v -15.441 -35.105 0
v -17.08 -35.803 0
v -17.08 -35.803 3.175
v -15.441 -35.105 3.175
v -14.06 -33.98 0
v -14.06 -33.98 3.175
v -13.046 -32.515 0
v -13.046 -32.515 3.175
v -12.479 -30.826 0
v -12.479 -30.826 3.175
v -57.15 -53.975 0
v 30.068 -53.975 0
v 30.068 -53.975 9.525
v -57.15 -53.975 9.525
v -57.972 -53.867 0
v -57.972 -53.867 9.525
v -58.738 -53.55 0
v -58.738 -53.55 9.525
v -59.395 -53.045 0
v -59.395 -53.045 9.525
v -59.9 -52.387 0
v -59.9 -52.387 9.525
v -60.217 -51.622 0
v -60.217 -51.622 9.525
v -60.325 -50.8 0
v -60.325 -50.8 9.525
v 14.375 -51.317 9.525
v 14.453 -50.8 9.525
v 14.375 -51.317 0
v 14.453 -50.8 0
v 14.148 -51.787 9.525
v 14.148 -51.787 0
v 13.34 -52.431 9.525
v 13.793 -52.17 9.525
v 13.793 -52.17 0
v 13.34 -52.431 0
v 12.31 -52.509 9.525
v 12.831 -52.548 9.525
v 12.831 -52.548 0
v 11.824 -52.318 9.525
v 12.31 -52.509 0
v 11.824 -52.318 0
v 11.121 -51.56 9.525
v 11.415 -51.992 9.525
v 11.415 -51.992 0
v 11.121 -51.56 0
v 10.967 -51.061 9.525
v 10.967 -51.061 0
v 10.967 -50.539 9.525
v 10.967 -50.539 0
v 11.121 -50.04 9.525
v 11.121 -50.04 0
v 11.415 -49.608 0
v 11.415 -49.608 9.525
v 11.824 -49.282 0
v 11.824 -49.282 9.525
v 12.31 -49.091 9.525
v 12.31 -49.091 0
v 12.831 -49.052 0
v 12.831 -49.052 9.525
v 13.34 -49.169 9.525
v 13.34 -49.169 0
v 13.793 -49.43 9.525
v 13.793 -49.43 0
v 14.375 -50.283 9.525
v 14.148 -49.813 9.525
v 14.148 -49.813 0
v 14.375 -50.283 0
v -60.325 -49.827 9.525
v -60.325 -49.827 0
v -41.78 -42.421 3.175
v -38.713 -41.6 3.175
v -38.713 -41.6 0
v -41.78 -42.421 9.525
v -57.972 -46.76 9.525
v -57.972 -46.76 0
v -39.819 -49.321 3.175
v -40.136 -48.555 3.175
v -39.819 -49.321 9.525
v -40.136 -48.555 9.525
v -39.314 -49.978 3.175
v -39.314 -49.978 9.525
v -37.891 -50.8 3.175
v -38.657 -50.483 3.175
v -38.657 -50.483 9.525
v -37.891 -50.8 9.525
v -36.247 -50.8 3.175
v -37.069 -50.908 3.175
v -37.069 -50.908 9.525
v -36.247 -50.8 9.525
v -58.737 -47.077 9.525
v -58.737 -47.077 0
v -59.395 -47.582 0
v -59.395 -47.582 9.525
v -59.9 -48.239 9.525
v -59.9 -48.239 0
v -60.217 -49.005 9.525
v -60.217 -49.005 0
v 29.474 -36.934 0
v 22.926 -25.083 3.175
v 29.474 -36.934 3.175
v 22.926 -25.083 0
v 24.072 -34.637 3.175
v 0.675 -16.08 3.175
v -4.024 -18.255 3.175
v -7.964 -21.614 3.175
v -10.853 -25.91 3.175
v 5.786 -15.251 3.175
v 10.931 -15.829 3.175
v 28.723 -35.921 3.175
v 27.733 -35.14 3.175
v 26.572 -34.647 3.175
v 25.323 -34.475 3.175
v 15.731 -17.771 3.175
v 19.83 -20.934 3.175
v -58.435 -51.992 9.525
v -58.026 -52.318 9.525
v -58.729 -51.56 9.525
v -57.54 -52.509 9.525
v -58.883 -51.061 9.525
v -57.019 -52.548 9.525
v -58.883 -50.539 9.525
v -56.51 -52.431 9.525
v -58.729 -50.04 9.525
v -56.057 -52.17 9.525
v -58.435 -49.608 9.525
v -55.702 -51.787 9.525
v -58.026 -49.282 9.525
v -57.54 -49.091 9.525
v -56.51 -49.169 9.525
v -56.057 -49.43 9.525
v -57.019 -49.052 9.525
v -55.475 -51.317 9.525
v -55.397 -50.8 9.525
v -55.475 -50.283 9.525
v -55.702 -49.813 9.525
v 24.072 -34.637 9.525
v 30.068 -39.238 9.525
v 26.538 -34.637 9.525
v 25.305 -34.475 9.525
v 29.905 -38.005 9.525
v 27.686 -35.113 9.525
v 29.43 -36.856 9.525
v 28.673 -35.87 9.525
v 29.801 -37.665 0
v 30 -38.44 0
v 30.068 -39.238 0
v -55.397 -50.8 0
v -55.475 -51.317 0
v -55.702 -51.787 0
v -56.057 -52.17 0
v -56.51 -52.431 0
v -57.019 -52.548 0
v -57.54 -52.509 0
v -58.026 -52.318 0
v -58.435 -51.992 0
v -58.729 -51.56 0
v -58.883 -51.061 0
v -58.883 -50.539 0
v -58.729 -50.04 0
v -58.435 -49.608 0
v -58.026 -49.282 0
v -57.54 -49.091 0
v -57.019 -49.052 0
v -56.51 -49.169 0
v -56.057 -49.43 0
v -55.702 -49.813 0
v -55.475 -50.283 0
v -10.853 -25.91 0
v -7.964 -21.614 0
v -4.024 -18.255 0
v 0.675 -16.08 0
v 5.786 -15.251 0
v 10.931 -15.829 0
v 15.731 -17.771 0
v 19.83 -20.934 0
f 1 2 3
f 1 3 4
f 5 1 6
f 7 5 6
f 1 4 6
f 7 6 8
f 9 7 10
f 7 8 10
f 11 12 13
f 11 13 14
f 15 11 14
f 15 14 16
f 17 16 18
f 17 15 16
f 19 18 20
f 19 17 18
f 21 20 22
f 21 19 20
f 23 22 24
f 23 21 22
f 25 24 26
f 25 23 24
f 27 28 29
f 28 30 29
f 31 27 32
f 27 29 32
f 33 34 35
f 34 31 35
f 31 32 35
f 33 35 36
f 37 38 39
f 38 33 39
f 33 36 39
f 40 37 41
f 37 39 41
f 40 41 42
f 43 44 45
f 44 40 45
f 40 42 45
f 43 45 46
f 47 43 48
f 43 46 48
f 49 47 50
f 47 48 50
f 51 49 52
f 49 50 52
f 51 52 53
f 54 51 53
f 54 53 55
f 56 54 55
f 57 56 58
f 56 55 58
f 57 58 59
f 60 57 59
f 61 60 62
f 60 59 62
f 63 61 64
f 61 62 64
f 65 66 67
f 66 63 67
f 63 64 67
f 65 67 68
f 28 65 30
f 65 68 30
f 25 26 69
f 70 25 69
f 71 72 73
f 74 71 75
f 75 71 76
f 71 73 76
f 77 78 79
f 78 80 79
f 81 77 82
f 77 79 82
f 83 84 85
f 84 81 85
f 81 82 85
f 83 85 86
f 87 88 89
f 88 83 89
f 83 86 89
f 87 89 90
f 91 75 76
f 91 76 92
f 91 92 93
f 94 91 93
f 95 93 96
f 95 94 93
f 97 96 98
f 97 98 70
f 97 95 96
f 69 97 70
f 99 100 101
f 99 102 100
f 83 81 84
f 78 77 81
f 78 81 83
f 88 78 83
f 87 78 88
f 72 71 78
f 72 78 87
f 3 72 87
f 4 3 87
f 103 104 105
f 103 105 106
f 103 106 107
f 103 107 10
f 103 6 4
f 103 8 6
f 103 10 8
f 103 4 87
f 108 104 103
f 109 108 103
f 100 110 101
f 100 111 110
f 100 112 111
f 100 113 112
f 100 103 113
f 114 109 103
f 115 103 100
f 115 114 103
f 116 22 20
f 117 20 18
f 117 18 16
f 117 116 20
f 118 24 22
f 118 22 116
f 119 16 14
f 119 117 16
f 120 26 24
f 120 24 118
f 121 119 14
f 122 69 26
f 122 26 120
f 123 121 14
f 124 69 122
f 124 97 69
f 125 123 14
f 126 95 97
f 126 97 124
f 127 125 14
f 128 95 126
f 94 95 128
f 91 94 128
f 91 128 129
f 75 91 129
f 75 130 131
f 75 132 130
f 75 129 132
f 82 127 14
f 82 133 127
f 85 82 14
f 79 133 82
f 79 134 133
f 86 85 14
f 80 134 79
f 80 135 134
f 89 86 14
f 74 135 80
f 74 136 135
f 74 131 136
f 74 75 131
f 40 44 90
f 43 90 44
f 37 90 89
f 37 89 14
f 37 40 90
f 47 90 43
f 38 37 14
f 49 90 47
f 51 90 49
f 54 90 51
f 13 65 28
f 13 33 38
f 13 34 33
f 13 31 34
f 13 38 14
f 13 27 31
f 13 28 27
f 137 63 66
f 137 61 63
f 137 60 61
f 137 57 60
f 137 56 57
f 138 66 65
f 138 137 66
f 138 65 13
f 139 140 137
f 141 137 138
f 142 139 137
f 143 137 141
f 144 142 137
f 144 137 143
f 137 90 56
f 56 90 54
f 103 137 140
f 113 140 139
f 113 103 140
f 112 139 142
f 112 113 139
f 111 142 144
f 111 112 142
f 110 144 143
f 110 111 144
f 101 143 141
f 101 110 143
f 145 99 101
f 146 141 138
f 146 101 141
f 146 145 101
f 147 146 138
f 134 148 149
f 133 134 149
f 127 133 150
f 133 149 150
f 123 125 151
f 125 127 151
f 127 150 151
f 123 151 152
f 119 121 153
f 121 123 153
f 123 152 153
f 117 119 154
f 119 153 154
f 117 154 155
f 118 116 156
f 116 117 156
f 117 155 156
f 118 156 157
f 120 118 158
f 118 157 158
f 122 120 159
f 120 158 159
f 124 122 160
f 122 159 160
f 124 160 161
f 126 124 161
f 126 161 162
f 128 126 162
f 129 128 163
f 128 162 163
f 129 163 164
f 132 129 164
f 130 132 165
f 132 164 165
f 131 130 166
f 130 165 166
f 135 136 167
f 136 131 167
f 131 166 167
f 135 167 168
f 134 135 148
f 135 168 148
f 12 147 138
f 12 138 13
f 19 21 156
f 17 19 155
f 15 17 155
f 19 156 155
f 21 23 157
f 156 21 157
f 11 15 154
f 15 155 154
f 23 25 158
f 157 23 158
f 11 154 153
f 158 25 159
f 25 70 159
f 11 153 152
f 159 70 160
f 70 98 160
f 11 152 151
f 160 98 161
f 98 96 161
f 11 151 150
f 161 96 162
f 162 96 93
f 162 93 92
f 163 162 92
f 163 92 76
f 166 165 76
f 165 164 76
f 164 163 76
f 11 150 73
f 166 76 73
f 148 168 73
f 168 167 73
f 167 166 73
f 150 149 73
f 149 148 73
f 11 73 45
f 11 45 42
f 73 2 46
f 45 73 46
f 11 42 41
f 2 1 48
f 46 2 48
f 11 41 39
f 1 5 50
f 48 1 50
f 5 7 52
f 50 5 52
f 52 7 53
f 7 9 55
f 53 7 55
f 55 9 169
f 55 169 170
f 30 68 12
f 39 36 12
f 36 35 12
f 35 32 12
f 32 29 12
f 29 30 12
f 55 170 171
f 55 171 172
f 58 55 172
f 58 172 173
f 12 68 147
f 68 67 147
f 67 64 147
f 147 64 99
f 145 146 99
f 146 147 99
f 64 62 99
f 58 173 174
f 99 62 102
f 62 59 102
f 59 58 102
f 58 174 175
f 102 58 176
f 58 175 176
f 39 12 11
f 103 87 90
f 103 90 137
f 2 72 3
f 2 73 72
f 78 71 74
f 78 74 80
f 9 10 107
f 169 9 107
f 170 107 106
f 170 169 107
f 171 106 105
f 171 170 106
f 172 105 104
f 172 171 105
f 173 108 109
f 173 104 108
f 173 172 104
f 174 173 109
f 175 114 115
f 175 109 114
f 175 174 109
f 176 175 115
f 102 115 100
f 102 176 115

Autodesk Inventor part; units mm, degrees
ref_plane "YZ Plane" through (0, 0, 0) normal (1, 0, 0) x (0, 1, 0)
ref_plane "XZ Plane" through (0, 0, 0) normal (0, 1, 0) x (-1, 0, 0)
ref_plane "XY Plane" through (0, 0, 0) normal (0, 0, 1) x (1, 0, 0)
sketch "Sketch2" plane through (0, 0, 0) normal (0, 0, 1) x (1, 0, 0)
  circle A0 centre (0, 0) radius 3.175 construction
  circle A1 centre (0, 0) radius 7.9375 construction
  line L0 (-24.9815, -53.975) -> (30.0677, -53.975)
  line L1 (-24.9815, -53.975) -> (-36.2864, -11.7845) construction
  line L2 (-36.2864, -11.7845) -> (-3.9688, 6.8741) construction
  line L3 (20.5427, -47.625) -> (-13.5349, -47.625)
  line L4 (-13.5349, -47.625) -> (-22.3476, -14.7355) construction
  line L5 (-22.3476, -14.7355) -> (-5.9414, -5.2634) construction
  line L6 (-18.5621, -41.1307) -> (-23.4926, -22.7298) construction
  line L7 (-23.4926, -22.7298) -> (-29.6262, -24.3733) construction
  line L8 (-29.6262, -24.3733) -> (-24.6957, -42.7742) construction
  line L9 (-24.6957, -42.7742) -> (-18.5621, -41.1307) construction
  line L10 (-18.5621, -41.1307) -> (-29.6262, -24.3733) construction
  line L11 (-23.4926, -22.7298) -> (-24.6957, -42.7742) construction
  circle A2 centre (-29.6262, -24.3733) radius 1.7526 construction
  circle A3 centre (-24.6957, -42.7742) radius 1.7526 construction
  circle A4 centre (-21.0273, -31.9303) radius 1.7526 construction
  line L12 (25.3052, -45.5804) -> (25.3052, -53.975)
  circle A5 centre (25.3052, -39.2375) radius 1.7526
  line L13 (0, 0) -> (-58.6646, -15.7191) construction
  line L14 (-24.0941, -32.752) -> (-30.6681, -8.2175) construction
  circle A6 centre (25.3052, -39.2375) radius 4.7625
  line L15 (30.0677, -39.2375) -> (30.0677, -53.975)
  line L16 (20.5427, -39.2375) -> (20.5427, -47.625)
  line L17 (-30.2278, -34.3955) -> (-17.9605, -31.1085) construction
  line L18 (-24.9815, -53.975) -> (-113.8815, -53.975)
  circle A7 centre (-9.9632, -48.6877) radius 1.7526
  line L19 (-9.9632, -48.6877) -> (-25.2973, -52.7964) construction
  line L20 (25.3052, -39.2375) -> (24.0725, -34.6373)
  line L21 (-31.2313, -30.6503) -> (-77.8688, -47.625) construction
  line L22 (-77.8688, -47.625) -> (-26.6829, -47.625) construction
  line L23 (-9.9632, -48.6877) -> (-10.4168, -46.9948) construction
  circle A8 centre (25.3052, -39.2375) radius 1.7526
  circle A9 centre (25.3052, -39.2375) radius 4.7625
  line L24 (17.994, -39.5531) -> (8.9547, -5.8181) construction
  line L25 (8.9547, -5.8181) -> (-22.4801, -14.241) construction
  line L26 (-22.4801, -14.241) -> (-13.4409, -47.976) construction
  line L27 (-0.2817, -44.45) -> (17.994, -39.5531) construction
  line L28 (17.994, -39.5531) -> (-22.4801, -14.241) construction
  line L29 (8.9547, -5.8181) -> (-13.4409, -47.976) construction
  line L30 (6.9477, 3.8384) -> (29.4738, -36.9345)
  line L31 (2.0544, -7.667) -> (8.9547, -5.8181) construction
  circle A10 centre (-9.9632, -48.6877) radius 4.7625
  line L32 (-0.2817, -44.45) -> (-14.3857, -44.45) construction
  line L33 (-113.8815, -53.975) -> (-32.8811, -24.4933) construction
  circle A11 centre (-54.7623, -40.9695) radius 1.7526 construction
  circle A12 centre (-54.7623, -40.9695) radius 7.9375 construction
  line L34 (-54.7623, -40.9695) -> (-56.8404, -33.2138) construction
  line L35 (-25.8322, -50.8) -> (-105.1582, -50.8) construction
  circle A13 centre (-57.15, -50.8) radius 1.7526
  circle A14 centre (-66.675, -50.8) radius 1.7526 construction
  circle A15 centre (-76.2, -50.8) radius 1.7526 construction
  circle A16 centre (-85.725, -50.8) radius 1.7526 construction
  circle A17 centre (12.7, -50.8) radius 1.7526
  line L36 (-2.2431, -26.897) -> (20.5536, -20.7887) construction
  line L37 (25.3052, -39.2375) -> (-9.9632, -48.6877) construction
  line L38 (26.5378, -43.8377) -> (-8.7306, -53.2879)
  line L39 (-48.0967, -53.975) -> (24.0725, -34.6373)
  arc A18 (26.5378, -43.8377) -> (24.0725, -34.6373) centre (25.3052, -39.2375) ccw
  arc A19 (-11.1958, -44.0874) -> (-8.7306, -53.2879) centre (-9.9632, -48.6877) ccw
  line L40 (-36.2475, -50.8) -> (-36.2475, -53.975) construction
  line L41 (-36.2475, -50.8) -> (-38.7127, -41.5996) construction
  line L42 (-38.7127, -41.5996) -> (-84.8985, -53.975)
  circle A20 centre (-37.0692, -47.7332) radius 3.175
  line L43 (-41.7795, -42.4213) -> (-39.3143, -51.6218)
  line L44 (-38.7127, -41.5996) -> (22.9264, -25.0834)
  arc A21 (22.9264, -25.0834) -> (-12.7947, -34.6548) centre (6.2519, -34.2957) ccw
  line L45 (-39.3143, -51.6218) -> (27.6718, -33.6729) construction
  circle A22 centre (-57.15, -50.8) radius 3.175
  line L46 (-60.325, -50.8) -> (-60.325, -47.3906)
  point P0 (30.0677, -39.2375)
  point P1 (-24.0941, -32.752)
  point P2 (-2.2431, -26.897)
  point P3 (-12.1309, -47.625)
  point P4 (-15.5208, -47.3441)
  point P5 (-14.3857, -44.45)
  point P6 (-9.6568, -46.9621)
  point P7 (-9.6568, -46.9621)
  point P8 (-48.0301, -36.7646)
  point P9 (-59.0876, -47.625)
  point P10 (-62.6223, -42.0757)
  point P11 (-50.4369, -47.625)
  point P12 (0.6918, 7.9073)
  point P13 (7.671, -43.9626)
  point P14 (26.5378, -43.8377)
  point P15 (-40.136, -48.5549)
  point P16 (-57.15, -53.975)
  dimension "d40" = 3.5052
  dimension "d6" = 6.35
  dimension "d7" = 15.875
  dimension "Angle_Mount" = 105
  dimension "d17" = 105
  dimension "d19" = 9.525
  dimension "d20" = 12.7
  dimension "d24" = 19.05
  dimension "d25" = 6.35
  dimension "d26" = 3.5052
  dimension "d27" = 3.5052
  dimension "d28" = 3.5052
  dimension "d29" = 6.35
  dimension "d33" = 3.5052
  dimension "d35" = 31.75
  dimension "d37" = 9.525
  dimension "d38" = 25.4
  dimension "d39" = 53.975
  dimension "d41" = 44.45
  dimension "Rail_Offset" = 36.5125
  dimension "d45" = 6.35
  dimension "d48" = 22.225
  dimension "d49" = 3.5052
  dimension "d51" = 9.525
  dimension "d52" = 32.5438
  dimension "d53" = 34.925
  dimension "d54" = 9.525
  dimension "d56" = 9.525
  dimension "d58" = 6.35
  dimension "d60" = 20
  dimension "d61" = 88.9
  dimension "d69" = 31.75
  dimension "d71" = 3.5052
  dimension "d72" = 15.875
  dimension "d74" = 3.175
  dimension "d75" = 3.5052
  dimension "d76" = 57.15
  dimension "d79" = 9.525
  dimension "d84" = 3.5052
  dimension "d85" = 69.85
  dimension "d106" = 3.175
  dimension "d107" = 9.525
  dimension "d109" = 6.35
  dimension "d113" = 19.05
  dimension "d122" = 9.525
extrude "Extrusion2" add sketch "Sketch2" along normal blind 9.525 contours L18 L39 A10 L38 L3 L16 A6 L15 L0 | L18 A22 L46 L42 L43 L39 | A22 | A6 | L38 L16 A6 | A10 | L39 A6 L16 L38 L3 A10 | L16 L3 L38 | A10 L3 L38 | A7 L3 | L3 A7 | A5
extrude "Extrusion3" add sketch "Sketch2" along normal blind 3.175 contours L43 A20 L39 | A20 L43 L42 L44 L30 A6 L39 | A20 | L38 L16 A6 | A10 | L39 A6 L16 L38 L3 A10 | L44 A21 | A10 L3 L38 | A7 L3 | L3 A7
fillet "Fillet6" radius 6.35 3 edges at (22.9264, -25.0834, 1.5875) (-12.7947, -34.6548, 1.5875) (29.4738, -36.9345, 1.5875)
fillet "Fillet7" radius 3.175 2 edges at (-39.3143, -51.6218, 6.35) (-60.325, -47.3906, 4.7625)
properties part number "Uprights" material "UHMW, White"
